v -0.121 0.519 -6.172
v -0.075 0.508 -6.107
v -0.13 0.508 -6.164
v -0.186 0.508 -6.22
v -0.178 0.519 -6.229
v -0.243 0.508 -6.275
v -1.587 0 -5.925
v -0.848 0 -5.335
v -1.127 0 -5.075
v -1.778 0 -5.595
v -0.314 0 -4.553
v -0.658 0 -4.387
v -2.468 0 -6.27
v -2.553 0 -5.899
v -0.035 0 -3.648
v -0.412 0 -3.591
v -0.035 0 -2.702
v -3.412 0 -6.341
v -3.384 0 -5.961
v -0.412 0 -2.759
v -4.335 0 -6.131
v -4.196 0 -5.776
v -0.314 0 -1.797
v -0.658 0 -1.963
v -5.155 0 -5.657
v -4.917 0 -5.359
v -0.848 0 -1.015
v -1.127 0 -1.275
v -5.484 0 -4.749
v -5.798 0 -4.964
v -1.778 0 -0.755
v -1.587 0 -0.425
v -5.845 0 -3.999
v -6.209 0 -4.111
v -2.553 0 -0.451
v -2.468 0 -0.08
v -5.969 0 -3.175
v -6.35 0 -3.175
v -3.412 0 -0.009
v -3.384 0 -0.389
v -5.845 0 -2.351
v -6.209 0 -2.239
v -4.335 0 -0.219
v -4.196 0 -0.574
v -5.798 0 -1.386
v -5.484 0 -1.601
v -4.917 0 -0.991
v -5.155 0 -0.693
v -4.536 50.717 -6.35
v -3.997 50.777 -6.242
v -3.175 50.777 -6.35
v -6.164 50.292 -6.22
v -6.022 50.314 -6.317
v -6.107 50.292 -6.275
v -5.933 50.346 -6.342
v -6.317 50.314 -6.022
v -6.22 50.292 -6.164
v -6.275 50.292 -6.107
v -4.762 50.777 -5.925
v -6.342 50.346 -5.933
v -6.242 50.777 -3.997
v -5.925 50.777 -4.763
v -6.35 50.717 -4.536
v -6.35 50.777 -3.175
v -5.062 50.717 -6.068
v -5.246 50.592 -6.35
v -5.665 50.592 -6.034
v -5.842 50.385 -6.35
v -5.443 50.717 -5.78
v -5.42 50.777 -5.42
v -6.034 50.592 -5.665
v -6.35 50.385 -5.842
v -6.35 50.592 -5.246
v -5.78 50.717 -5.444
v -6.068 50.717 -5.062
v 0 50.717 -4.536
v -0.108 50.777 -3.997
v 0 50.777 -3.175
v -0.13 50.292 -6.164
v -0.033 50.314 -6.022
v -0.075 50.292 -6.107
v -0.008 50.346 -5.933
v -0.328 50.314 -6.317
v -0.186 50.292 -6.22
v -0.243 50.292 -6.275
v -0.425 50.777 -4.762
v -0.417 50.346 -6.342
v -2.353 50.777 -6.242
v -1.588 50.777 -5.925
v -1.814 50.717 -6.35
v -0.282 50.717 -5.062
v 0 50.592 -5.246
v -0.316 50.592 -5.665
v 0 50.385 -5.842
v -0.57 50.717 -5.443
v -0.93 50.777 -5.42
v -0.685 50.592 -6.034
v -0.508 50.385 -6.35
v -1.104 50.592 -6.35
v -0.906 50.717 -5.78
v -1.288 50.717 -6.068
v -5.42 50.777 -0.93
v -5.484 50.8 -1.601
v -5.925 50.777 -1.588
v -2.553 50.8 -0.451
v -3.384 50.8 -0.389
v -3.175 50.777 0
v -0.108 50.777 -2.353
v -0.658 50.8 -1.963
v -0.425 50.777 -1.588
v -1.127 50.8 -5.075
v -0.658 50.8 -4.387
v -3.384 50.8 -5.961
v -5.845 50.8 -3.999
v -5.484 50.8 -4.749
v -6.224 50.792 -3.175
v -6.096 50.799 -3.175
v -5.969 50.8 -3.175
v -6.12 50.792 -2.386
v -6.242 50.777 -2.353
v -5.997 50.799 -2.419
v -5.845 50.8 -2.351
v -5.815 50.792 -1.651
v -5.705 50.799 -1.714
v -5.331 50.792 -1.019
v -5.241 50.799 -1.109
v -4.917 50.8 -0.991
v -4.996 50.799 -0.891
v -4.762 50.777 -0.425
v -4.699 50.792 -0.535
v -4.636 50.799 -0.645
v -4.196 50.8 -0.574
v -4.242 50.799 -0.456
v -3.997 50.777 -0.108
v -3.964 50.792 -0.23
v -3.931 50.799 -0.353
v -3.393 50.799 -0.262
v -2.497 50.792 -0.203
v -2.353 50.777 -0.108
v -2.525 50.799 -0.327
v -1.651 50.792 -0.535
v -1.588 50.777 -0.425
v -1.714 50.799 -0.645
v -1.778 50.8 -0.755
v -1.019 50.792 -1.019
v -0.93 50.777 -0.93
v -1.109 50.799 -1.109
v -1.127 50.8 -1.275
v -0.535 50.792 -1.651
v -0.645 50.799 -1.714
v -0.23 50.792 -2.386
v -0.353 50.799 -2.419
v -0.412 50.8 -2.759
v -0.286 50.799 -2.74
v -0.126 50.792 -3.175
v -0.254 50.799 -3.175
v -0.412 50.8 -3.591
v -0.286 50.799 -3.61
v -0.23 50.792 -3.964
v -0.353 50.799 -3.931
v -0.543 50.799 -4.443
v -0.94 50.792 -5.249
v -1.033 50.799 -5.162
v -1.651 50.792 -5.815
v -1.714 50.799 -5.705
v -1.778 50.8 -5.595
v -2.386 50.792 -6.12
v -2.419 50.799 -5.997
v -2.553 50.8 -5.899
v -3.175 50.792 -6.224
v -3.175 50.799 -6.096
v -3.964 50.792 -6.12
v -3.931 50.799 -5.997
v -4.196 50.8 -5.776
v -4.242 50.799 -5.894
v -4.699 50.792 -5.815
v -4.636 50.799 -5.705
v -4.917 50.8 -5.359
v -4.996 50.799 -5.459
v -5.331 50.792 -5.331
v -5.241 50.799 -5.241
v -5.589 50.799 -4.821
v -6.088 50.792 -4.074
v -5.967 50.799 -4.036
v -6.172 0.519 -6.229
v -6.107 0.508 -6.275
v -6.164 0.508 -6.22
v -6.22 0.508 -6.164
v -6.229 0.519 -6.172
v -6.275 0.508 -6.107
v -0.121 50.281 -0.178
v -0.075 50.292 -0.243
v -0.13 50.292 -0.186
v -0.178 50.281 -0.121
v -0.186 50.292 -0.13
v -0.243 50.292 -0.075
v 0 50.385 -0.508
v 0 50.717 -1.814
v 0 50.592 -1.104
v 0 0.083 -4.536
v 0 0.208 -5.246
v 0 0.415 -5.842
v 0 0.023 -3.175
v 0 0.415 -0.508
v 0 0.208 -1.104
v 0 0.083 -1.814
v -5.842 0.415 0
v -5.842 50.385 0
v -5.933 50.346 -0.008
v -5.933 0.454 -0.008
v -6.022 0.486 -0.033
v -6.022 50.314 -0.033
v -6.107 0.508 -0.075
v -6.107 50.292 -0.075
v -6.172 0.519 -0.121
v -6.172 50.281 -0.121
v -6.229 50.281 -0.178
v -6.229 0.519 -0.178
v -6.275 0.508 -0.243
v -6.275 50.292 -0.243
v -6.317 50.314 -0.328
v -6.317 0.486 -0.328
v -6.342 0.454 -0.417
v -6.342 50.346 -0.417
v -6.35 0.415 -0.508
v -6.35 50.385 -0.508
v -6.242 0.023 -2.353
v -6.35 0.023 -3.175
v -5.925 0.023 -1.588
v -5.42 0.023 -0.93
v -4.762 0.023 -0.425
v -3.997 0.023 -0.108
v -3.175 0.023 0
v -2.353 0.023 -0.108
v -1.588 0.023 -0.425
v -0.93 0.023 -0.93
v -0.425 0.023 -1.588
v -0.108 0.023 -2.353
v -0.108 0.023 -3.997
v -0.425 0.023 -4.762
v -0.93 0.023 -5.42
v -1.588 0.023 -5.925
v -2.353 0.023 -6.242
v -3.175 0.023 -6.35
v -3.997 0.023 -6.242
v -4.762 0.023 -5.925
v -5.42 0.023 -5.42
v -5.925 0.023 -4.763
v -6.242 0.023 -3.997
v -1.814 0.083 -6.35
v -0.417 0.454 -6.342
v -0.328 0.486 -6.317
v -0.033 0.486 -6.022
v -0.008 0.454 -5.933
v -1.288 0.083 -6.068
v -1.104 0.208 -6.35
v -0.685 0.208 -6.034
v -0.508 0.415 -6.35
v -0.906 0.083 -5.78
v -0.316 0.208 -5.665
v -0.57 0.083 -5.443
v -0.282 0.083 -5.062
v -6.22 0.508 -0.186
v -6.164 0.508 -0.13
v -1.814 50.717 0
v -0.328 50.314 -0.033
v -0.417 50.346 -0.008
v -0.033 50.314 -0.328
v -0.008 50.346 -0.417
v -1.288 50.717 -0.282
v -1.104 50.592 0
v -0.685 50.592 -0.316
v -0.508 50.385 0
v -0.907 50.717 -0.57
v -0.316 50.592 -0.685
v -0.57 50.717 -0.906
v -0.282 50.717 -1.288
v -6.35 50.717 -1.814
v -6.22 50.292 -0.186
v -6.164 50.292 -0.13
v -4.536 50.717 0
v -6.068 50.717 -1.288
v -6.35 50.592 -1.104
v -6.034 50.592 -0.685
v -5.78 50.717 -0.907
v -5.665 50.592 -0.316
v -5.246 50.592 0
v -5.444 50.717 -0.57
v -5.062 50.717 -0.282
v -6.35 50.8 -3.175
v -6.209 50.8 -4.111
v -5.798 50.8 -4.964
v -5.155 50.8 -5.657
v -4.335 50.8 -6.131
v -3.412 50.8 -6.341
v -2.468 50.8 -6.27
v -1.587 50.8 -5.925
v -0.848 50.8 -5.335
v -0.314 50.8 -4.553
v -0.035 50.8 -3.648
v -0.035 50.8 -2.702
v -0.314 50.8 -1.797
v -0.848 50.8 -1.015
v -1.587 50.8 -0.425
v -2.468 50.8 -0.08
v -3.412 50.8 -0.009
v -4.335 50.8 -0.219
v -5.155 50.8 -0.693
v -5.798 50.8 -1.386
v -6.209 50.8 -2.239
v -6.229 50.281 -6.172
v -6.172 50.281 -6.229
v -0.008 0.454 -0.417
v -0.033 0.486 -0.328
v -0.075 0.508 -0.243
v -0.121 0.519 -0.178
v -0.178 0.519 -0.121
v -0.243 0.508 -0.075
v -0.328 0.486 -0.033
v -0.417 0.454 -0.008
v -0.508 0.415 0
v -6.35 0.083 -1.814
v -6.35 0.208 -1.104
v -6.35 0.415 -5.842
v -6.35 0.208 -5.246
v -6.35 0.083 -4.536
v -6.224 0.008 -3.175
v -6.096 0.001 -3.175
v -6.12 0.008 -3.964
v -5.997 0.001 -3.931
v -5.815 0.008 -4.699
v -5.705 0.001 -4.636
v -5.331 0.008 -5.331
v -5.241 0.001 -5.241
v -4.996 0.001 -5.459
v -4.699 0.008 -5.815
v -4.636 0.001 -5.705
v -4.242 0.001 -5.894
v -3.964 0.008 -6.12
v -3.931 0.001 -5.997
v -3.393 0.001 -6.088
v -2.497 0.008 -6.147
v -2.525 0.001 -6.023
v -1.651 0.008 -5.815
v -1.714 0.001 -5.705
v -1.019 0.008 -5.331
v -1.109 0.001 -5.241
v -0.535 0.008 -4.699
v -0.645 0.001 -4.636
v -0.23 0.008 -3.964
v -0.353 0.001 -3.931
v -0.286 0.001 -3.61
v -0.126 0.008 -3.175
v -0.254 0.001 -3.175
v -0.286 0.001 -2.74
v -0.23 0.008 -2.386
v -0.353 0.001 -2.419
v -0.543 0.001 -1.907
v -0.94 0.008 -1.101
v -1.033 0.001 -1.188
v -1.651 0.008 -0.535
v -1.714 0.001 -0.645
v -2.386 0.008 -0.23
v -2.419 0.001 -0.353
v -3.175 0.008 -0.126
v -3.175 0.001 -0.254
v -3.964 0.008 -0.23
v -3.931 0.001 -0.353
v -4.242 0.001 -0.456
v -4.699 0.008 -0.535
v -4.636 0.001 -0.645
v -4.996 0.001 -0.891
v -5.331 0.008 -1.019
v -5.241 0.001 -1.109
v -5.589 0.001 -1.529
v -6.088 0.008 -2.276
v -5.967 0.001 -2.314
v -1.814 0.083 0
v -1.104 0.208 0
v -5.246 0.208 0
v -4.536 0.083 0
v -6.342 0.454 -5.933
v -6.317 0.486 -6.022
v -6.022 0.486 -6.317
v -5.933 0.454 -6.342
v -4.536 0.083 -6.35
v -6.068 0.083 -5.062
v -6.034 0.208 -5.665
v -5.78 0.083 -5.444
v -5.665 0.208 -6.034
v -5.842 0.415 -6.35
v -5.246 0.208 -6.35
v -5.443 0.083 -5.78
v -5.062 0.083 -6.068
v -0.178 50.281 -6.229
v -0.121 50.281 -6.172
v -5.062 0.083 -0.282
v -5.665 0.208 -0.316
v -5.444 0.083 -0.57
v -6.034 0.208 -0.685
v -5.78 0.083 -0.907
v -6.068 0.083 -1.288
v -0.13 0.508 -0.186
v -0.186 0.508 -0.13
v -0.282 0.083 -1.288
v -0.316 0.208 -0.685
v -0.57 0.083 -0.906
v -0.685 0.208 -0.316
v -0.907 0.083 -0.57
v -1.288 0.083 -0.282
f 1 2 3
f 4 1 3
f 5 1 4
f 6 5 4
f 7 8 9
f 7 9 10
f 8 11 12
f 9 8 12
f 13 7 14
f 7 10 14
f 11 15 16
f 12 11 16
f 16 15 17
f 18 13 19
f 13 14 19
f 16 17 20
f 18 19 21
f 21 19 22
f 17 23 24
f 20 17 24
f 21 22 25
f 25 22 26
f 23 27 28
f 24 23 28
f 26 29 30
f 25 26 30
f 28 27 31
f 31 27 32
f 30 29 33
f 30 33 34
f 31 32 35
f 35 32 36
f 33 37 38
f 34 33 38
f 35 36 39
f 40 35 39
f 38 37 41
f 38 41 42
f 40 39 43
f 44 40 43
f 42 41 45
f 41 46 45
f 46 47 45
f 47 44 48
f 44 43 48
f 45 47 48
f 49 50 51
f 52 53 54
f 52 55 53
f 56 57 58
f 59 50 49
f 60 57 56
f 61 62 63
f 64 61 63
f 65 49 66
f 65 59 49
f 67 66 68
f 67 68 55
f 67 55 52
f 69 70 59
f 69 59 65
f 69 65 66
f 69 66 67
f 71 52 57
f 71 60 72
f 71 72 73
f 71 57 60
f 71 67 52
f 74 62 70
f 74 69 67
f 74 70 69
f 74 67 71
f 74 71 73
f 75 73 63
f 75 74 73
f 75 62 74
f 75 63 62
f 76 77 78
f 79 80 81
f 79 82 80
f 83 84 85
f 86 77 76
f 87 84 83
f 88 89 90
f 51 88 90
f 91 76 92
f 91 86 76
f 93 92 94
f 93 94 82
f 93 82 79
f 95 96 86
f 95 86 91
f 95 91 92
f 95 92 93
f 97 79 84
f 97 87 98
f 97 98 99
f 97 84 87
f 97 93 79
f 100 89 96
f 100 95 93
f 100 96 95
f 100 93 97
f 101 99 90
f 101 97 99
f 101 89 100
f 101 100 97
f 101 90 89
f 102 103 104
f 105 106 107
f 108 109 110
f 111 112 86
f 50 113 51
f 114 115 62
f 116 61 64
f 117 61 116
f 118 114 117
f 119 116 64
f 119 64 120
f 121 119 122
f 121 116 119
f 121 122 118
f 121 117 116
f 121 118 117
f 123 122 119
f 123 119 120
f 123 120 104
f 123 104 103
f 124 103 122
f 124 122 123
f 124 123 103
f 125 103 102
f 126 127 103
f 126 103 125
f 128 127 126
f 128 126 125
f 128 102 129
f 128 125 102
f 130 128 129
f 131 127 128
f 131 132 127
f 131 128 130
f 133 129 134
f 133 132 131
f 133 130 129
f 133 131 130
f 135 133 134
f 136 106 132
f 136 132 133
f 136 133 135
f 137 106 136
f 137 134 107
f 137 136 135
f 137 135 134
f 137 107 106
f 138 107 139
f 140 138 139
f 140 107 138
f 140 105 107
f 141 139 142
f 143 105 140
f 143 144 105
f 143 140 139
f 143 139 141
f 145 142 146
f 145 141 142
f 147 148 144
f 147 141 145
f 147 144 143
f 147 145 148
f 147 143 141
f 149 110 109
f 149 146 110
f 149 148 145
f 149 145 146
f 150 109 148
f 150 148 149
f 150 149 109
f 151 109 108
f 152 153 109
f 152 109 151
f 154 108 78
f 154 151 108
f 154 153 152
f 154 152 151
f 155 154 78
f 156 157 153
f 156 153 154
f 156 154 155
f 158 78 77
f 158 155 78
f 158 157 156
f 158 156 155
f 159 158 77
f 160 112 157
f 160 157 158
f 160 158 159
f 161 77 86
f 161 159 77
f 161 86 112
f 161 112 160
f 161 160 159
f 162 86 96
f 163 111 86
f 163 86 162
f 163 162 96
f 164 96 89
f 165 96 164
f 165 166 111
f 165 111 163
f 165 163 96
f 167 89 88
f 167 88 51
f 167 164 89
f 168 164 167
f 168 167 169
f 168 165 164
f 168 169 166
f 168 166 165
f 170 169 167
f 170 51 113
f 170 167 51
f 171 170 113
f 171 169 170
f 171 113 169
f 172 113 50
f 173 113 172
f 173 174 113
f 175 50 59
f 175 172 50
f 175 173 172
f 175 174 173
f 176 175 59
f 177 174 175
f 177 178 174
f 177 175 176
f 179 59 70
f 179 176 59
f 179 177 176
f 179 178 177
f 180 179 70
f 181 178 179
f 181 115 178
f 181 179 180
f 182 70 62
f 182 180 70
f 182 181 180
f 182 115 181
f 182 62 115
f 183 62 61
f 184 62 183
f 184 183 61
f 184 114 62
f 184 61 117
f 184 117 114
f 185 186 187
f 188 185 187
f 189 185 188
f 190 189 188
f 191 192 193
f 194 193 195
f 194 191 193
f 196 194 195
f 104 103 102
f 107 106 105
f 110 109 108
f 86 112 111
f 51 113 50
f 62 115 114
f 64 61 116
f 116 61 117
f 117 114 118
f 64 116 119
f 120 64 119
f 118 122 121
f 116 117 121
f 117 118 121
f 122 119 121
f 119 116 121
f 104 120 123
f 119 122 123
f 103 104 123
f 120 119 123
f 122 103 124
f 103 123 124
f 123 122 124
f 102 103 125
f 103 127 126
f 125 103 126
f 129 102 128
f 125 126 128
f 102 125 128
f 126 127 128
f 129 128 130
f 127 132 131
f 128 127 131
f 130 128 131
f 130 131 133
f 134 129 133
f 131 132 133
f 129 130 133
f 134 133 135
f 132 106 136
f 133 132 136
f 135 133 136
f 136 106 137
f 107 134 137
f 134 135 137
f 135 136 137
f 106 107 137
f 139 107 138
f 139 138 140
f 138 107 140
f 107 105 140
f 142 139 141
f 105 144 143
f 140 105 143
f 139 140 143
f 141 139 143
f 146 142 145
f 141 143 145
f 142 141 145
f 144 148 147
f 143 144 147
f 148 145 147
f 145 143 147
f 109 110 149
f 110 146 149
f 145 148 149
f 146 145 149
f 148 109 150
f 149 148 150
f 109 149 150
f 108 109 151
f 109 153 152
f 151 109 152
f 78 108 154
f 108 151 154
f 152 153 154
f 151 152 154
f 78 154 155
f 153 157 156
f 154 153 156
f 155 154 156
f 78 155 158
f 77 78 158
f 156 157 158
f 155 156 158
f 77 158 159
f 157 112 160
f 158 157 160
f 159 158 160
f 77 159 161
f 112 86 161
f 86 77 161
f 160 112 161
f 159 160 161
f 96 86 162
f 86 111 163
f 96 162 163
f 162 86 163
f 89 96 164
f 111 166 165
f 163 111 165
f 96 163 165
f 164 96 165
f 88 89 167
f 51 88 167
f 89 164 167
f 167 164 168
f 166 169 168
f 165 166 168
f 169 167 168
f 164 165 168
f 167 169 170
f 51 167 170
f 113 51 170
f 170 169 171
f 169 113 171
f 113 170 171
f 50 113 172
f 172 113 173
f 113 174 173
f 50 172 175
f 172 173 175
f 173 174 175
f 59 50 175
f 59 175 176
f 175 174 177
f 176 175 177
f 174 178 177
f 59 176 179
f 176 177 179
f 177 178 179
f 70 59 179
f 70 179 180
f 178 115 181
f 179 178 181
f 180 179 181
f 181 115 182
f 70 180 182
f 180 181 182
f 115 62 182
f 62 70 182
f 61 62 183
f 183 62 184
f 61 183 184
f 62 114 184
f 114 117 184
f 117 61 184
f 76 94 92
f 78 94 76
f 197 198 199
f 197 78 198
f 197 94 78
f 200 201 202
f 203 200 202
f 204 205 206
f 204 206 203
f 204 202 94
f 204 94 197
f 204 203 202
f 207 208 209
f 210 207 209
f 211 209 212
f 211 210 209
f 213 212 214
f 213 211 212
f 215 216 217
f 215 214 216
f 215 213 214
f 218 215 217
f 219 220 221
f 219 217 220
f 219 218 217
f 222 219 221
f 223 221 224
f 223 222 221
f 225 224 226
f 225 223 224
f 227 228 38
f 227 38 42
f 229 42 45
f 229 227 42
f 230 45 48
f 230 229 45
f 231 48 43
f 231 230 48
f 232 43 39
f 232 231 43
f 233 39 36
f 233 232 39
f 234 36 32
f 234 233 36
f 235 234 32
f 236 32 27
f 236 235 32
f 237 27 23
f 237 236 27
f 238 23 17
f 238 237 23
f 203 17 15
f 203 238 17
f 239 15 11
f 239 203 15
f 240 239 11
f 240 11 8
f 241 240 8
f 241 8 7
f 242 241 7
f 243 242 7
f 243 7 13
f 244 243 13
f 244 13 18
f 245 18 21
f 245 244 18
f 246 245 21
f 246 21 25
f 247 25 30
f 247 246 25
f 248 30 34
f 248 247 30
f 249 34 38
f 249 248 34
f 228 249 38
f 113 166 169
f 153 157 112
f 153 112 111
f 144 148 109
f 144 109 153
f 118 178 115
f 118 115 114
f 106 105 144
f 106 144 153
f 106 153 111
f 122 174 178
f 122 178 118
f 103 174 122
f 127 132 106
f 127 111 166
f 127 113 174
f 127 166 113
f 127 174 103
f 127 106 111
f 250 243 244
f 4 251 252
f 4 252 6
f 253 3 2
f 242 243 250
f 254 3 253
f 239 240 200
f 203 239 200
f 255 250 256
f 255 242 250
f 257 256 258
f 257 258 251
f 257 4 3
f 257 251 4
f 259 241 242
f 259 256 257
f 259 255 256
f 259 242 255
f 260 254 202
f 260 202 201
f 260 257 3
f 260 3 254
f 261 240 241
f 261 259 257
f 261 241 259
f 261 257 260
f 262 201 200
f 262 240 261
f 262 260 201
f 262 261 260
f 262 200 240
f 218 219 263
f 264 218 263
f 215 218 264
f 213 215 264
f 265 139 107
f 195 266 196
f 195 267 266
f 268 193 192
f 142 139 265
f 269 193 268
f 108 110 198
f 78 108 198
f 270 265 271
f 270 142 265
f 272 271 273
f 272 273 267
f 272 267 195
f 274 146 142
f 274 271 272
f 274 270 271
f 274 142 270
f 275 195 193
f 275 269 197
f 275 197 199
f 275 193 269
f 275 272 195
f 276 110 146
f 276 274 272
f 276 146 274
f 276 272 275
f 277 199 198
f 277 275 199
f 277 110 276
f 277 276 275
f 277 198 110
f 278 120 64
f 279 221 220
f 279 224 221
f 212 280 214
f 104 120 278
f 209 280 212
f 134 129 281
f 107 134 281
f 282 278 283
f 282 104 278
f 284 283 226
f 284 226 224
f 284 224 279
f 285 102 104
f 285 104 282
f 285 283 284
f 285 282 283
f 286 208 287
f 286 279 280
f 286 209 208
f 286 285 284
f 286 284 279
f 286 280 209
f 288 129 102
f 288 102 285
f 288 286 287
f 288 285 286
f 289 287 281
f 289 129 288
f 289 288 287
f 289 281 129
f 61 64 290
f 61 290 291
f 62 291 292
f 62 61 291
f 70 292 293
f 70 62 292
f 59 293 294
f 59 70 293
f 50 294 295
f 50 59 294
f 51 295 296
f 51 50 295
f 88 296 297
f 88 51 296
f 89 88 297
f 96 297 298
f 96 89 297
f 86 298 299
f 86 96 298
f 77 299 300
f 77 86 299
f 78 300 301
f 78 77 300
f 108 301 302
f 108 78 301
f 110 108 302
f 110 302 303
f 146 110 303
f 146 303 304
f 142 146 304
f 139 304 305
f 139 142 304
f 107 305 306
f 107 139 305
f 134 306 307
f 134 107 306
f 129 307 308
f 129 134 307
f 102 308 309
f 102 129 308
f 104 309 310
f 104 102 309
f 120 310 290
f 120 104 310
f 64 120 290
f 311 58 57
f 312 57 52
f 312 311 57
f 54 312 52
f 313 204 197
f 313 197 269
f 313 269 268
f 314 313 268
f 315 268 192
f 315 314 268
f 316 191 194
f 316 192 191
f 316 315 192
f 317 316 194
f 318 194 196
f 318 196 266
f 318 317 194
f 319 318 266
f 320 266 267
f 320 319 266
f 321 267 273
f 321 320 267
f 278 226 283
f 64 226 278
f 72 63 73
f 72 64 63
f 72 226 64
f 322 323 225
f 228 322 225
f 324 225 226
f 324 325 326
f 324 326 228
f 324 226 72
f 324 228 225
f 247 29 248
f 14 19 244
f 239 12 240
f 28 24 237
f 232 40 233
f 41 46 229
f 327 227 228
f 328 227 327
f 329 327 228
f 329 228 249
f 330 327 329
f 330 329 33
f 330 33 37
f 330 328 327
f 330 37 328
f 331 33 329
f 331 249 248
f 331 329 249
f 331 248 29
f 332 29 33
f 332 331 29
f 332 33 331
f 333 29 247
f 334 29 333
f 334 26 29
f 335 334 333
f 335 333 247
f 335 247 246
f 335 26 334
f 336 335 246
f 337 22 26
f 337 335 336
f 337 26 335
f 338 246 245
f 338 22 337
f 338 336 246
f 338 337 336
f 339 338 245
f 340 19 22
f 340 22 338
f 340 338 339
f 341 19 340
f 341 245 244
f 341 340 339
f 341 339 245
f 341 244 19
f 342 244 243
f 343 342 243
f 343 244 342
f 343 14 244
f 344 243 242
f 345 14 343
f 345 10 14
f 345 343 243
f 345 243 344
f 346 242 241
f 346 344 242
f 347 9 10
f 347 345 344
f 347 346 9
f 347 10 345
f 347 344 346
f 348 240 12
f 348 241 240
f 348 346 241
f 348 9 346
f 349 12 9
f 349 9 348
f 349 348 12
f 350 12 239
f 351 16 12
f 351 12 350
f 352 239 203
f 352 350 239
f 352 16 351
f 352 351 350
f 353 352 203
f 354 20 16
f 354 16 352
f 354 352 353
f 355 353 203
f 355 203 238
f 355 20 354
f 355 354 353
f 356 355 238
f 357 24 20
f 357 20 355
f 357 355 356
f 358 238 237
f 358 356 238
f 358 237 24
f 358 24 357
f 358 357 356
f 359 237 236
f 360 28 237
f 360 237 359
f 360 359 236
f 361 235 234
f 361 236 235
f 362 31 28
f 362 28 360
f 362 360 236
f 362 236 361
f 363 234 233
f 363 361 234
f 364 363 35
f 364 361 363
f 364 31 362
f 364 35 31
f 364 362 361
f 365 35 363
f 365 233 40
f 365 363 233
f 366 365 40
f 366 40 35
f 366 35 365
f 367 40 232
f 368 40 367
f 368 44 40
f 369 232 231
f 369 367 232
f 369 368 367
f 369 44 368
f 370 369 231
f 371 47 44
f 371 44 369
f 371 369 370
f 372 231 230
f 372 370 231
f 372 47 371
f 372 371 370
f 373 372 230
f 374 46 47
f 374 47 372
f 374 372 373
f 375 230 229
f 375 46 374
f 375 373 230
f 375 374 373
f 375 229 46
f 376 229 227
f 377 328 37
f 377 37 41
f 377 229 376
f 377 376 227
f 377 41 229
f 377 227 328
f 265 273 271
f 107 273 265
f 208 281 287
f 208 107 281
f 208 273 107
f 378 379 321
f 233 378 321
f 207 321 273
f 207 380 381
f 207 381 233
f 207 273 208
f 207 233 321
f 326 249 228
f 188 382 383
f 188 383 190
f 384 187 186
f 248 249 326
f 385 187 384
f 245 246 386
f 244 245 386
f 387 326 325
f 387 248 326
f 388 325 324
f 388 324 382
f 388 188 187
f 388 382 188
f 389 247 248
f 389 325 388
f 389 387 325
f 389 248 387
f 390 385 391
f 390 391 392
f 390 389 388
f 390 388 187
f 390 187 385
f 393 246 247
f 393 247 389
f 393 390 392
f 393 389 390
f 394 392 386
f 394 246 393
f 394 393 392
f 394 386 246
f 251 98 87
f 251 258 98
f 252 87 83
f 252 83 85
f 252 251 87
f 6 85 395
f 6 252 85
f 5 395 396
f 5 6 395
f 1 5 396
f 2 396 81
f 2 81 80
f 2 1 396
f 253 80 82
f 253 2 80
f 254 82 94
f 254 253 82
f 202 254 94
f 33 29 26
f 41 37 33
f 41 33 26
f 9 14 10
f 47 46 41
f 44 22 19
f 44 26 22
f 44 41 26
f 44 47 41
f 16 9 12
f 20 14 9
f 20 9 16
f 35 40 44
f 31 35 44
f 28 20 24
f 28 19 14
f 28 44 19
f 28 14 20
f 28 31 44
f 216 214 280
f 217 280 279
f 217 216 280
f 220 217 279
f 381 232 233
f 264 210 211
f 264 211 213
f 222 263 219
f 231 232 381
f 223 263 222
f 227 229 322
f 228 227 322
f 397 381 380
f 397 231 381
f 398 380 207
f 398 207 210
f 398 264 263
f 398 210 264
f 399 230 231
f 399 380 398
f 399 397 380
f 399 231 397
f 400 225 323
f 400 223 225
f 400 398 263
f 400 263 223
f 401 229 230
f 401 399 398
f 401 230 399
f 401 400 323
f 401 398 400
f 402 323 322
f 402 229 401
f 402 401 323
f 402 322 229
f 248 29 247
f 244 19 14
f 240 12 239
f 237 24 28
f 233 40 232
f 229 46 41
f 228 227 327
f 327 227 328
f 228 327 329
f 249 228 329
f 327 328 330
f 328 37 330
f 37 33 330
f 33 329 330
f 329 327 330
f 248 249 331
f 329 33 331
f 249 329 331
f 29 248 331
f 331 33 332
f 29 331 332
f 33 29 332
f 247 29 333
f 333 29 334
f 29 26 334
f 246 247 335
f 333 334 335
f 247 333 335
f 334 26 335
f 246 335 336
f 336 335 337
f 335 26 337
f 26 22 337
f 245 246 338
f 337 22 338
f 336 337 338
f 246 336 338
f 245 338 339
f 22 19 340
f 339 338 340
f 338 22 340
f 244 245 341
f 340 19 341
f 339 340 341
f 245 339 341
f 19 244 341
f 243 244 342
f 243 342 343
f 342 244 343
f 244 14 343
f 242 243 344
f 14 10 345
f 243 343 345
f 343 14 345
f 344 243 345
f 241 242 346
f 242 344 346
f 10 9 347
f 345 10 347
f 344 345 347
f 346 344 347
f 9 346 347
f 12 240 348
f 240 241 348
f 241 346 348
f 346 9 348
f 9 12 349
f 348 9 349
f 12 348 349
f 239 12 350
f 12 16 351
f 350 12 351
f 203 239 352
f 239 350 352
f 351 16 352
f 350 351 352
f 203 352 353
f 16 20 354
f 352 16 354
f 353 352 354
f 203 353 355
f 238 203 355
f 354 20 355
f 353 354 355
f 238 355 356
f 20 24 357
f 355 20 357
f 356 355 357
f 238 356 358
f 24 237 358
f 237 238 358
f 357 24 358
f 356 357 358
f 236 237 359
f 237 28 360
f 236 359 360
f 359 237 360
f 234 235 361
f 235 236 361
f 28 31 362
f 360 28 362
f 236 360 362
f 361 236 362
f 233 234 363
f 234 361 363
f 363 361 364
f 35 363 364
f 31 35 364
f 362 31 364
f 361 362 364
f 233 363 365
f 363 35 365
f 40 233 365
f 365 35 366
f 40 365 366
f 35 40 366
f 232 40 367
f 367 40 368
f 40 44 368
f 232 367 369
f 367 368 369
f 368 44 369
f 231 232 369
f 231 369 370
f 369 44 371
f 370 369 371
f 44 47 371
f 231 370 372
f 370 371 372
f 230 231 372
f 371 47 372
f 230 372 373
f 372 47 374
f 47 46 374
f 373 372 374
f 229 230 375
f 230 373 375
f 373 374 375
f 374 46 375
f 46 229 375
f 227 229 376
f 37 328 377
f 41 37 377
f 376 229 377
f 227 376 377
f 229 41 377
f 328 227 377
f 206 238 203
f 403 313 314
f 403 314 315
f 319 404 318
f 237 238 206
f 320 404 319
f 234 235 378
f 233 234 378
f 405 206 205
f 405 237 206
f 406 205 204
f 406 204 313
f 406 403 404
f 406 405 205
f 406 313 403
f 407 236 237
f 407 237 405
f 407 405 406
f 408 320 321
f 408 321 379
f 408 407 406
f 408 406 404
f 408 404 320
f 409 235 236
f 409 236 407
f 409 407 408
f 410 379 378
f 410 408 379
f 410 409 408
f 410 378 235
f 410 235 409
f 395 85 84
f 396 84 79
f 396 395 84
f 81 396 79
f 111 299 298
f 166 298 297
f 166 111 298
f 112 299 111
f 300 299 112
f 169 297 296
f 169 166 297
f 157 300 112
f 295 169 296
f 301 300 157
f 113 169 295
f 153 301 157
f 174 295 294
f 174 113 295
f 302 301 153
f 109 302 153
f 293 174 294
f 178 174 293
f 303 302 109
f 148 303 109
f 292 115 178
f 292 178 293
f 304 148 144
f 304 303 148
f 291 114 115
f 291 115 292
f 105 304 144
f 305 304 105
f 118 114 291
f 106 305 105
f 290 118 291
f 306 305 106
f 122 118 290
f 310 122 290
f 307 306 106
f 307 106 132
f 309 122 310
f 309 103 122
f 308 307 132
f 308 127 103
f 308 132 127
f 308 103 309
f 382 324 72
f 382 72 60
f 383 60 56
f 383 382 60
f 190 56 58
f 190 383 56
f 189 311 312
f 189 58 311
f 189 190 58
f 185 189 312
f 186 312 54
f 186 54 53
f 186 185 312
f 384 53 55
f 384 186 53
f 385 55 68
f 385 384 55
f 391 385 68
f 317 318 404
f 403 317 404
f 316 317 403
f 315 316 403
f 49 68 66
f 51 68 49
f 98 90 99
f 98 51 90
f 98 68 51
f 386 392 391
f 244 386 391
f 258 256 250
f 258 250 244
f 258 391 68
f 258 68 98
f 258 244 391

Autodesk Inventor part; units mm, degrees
ref_plane "YZ Plane" through (0, 0, 0) normal (1, 0, 0) x (0, 1, 0)
sketch "Sketch1" plane through (0, 0, 0) normal (0, 1, 0) x (-1, 0, 0)
  line L0 (0.508, 0) -> (5.842, 0)
  line L1 (6.35, -0.508) -> (6.35, -5.842)
  line L2 (5.842, -6.35) -> (0.508, -6.35)
  line L3 (0, -5.842) -> (0, -0.508)
  arc A0 (5.842, -6.35) -> (6.35, -5.842) centre (5.842, -5.842) ccw
  arc A1 (0, -5.842) -> (0.508, -6.35) centre (0.508, -5.842) ccw
  arc A2 (0.508, 0) -> (0, -0.508) centre (0.508, -0.508) ccw
  arc A3 (6.35, -0.508) -> (5.842, 0) centre (5.842, -0.508) ccw
  arc A4 (3.8748, -6.35) -> (6.35, -3.8748) centre (3.175, -3.175) ccw
  arc A5 (0, -3.8748) -> (2.4752, -6.35) centre (3.175, -3.175) ccw
  arc A6 (6.35, -2.4752) -> (3.8748, 0) centre (3.175, -3.175) ccw
  arc A7 (2.4752, 0) -> (0, -2.4752) centre (3.175, -3.175) ccw
  point P0 (0, 0)
  point P1 (6.35, -6.35)
  point P2 (6.35, 0)
  point P3 (0, -6.35)
  dimension "d0" = 6.35
  dimension "d1" = 6.35
  dimension "d2" = 0.508
extrude "Extrusion1" add sketch "Sketch1" along normal blind 50.8
ref_plane "Work Plane1" through (-0.508, 0, -3.175) normal (0, 0, -1) x (-1, 0, 0)
sketch "Sketch2" plane through (-0.508, 0, -3.175) normal (0, 0, -1) x (-1, 0, 0)
  line L0 (-0.508, 0) -> (-0.508, 50.8) projected
  line L1 (-0.508, 50.8) -> (5.842, 50.8) projected
  line L2 (5.842, 50.8) -> (5.842, 0) projected
  line L3 (5.842, 0) -> (-0.508, 0) projected
  line L4 (2.667, 50.8) -> (2.667, 51.5112)
  line L5 (2.667, 51.5112) -> (6.9342, 51.5112)
  line L6 (2.667, 50.8) -> (5.461, 50.8)
  arc A0 (6.9342, 50.292) -> (5.461, 50.8) centre (5.5146, 48.5654) ccw
  line L7 (6.9342, 51.5112) -> (7.1928, 51.5112)
  line L8 (7.1928, 51.5112) -> (7.1928, 50.042)
  line L9 (7.1928, 50.042) -> (6.9342, 50.292)
  dimension "d6" = 0.7112
  dimension "d7" = 4.2672
  dimension "d8" = 1.2192
  dimension "d9" = 2.794
  dimension "d10" = 2.2352
revolve "Revolution1" cut sketch "Sketch2" angle 360 about axis through (-3.175, 50.8, -3.175) along (0, 1, 0) contours L4 L5 L7 L8 L9 A0 L1
ref_plane "Work Plane2" through (-3.175, 25.4, -3.175) normal (0, 1, 0) x (1, 0, 0)
mirror "Mirror1" about plane through (-3.175, 25.4, -3.175) normal (0, 1, 0) of "Revolution1"
properties part number "276-3440"
